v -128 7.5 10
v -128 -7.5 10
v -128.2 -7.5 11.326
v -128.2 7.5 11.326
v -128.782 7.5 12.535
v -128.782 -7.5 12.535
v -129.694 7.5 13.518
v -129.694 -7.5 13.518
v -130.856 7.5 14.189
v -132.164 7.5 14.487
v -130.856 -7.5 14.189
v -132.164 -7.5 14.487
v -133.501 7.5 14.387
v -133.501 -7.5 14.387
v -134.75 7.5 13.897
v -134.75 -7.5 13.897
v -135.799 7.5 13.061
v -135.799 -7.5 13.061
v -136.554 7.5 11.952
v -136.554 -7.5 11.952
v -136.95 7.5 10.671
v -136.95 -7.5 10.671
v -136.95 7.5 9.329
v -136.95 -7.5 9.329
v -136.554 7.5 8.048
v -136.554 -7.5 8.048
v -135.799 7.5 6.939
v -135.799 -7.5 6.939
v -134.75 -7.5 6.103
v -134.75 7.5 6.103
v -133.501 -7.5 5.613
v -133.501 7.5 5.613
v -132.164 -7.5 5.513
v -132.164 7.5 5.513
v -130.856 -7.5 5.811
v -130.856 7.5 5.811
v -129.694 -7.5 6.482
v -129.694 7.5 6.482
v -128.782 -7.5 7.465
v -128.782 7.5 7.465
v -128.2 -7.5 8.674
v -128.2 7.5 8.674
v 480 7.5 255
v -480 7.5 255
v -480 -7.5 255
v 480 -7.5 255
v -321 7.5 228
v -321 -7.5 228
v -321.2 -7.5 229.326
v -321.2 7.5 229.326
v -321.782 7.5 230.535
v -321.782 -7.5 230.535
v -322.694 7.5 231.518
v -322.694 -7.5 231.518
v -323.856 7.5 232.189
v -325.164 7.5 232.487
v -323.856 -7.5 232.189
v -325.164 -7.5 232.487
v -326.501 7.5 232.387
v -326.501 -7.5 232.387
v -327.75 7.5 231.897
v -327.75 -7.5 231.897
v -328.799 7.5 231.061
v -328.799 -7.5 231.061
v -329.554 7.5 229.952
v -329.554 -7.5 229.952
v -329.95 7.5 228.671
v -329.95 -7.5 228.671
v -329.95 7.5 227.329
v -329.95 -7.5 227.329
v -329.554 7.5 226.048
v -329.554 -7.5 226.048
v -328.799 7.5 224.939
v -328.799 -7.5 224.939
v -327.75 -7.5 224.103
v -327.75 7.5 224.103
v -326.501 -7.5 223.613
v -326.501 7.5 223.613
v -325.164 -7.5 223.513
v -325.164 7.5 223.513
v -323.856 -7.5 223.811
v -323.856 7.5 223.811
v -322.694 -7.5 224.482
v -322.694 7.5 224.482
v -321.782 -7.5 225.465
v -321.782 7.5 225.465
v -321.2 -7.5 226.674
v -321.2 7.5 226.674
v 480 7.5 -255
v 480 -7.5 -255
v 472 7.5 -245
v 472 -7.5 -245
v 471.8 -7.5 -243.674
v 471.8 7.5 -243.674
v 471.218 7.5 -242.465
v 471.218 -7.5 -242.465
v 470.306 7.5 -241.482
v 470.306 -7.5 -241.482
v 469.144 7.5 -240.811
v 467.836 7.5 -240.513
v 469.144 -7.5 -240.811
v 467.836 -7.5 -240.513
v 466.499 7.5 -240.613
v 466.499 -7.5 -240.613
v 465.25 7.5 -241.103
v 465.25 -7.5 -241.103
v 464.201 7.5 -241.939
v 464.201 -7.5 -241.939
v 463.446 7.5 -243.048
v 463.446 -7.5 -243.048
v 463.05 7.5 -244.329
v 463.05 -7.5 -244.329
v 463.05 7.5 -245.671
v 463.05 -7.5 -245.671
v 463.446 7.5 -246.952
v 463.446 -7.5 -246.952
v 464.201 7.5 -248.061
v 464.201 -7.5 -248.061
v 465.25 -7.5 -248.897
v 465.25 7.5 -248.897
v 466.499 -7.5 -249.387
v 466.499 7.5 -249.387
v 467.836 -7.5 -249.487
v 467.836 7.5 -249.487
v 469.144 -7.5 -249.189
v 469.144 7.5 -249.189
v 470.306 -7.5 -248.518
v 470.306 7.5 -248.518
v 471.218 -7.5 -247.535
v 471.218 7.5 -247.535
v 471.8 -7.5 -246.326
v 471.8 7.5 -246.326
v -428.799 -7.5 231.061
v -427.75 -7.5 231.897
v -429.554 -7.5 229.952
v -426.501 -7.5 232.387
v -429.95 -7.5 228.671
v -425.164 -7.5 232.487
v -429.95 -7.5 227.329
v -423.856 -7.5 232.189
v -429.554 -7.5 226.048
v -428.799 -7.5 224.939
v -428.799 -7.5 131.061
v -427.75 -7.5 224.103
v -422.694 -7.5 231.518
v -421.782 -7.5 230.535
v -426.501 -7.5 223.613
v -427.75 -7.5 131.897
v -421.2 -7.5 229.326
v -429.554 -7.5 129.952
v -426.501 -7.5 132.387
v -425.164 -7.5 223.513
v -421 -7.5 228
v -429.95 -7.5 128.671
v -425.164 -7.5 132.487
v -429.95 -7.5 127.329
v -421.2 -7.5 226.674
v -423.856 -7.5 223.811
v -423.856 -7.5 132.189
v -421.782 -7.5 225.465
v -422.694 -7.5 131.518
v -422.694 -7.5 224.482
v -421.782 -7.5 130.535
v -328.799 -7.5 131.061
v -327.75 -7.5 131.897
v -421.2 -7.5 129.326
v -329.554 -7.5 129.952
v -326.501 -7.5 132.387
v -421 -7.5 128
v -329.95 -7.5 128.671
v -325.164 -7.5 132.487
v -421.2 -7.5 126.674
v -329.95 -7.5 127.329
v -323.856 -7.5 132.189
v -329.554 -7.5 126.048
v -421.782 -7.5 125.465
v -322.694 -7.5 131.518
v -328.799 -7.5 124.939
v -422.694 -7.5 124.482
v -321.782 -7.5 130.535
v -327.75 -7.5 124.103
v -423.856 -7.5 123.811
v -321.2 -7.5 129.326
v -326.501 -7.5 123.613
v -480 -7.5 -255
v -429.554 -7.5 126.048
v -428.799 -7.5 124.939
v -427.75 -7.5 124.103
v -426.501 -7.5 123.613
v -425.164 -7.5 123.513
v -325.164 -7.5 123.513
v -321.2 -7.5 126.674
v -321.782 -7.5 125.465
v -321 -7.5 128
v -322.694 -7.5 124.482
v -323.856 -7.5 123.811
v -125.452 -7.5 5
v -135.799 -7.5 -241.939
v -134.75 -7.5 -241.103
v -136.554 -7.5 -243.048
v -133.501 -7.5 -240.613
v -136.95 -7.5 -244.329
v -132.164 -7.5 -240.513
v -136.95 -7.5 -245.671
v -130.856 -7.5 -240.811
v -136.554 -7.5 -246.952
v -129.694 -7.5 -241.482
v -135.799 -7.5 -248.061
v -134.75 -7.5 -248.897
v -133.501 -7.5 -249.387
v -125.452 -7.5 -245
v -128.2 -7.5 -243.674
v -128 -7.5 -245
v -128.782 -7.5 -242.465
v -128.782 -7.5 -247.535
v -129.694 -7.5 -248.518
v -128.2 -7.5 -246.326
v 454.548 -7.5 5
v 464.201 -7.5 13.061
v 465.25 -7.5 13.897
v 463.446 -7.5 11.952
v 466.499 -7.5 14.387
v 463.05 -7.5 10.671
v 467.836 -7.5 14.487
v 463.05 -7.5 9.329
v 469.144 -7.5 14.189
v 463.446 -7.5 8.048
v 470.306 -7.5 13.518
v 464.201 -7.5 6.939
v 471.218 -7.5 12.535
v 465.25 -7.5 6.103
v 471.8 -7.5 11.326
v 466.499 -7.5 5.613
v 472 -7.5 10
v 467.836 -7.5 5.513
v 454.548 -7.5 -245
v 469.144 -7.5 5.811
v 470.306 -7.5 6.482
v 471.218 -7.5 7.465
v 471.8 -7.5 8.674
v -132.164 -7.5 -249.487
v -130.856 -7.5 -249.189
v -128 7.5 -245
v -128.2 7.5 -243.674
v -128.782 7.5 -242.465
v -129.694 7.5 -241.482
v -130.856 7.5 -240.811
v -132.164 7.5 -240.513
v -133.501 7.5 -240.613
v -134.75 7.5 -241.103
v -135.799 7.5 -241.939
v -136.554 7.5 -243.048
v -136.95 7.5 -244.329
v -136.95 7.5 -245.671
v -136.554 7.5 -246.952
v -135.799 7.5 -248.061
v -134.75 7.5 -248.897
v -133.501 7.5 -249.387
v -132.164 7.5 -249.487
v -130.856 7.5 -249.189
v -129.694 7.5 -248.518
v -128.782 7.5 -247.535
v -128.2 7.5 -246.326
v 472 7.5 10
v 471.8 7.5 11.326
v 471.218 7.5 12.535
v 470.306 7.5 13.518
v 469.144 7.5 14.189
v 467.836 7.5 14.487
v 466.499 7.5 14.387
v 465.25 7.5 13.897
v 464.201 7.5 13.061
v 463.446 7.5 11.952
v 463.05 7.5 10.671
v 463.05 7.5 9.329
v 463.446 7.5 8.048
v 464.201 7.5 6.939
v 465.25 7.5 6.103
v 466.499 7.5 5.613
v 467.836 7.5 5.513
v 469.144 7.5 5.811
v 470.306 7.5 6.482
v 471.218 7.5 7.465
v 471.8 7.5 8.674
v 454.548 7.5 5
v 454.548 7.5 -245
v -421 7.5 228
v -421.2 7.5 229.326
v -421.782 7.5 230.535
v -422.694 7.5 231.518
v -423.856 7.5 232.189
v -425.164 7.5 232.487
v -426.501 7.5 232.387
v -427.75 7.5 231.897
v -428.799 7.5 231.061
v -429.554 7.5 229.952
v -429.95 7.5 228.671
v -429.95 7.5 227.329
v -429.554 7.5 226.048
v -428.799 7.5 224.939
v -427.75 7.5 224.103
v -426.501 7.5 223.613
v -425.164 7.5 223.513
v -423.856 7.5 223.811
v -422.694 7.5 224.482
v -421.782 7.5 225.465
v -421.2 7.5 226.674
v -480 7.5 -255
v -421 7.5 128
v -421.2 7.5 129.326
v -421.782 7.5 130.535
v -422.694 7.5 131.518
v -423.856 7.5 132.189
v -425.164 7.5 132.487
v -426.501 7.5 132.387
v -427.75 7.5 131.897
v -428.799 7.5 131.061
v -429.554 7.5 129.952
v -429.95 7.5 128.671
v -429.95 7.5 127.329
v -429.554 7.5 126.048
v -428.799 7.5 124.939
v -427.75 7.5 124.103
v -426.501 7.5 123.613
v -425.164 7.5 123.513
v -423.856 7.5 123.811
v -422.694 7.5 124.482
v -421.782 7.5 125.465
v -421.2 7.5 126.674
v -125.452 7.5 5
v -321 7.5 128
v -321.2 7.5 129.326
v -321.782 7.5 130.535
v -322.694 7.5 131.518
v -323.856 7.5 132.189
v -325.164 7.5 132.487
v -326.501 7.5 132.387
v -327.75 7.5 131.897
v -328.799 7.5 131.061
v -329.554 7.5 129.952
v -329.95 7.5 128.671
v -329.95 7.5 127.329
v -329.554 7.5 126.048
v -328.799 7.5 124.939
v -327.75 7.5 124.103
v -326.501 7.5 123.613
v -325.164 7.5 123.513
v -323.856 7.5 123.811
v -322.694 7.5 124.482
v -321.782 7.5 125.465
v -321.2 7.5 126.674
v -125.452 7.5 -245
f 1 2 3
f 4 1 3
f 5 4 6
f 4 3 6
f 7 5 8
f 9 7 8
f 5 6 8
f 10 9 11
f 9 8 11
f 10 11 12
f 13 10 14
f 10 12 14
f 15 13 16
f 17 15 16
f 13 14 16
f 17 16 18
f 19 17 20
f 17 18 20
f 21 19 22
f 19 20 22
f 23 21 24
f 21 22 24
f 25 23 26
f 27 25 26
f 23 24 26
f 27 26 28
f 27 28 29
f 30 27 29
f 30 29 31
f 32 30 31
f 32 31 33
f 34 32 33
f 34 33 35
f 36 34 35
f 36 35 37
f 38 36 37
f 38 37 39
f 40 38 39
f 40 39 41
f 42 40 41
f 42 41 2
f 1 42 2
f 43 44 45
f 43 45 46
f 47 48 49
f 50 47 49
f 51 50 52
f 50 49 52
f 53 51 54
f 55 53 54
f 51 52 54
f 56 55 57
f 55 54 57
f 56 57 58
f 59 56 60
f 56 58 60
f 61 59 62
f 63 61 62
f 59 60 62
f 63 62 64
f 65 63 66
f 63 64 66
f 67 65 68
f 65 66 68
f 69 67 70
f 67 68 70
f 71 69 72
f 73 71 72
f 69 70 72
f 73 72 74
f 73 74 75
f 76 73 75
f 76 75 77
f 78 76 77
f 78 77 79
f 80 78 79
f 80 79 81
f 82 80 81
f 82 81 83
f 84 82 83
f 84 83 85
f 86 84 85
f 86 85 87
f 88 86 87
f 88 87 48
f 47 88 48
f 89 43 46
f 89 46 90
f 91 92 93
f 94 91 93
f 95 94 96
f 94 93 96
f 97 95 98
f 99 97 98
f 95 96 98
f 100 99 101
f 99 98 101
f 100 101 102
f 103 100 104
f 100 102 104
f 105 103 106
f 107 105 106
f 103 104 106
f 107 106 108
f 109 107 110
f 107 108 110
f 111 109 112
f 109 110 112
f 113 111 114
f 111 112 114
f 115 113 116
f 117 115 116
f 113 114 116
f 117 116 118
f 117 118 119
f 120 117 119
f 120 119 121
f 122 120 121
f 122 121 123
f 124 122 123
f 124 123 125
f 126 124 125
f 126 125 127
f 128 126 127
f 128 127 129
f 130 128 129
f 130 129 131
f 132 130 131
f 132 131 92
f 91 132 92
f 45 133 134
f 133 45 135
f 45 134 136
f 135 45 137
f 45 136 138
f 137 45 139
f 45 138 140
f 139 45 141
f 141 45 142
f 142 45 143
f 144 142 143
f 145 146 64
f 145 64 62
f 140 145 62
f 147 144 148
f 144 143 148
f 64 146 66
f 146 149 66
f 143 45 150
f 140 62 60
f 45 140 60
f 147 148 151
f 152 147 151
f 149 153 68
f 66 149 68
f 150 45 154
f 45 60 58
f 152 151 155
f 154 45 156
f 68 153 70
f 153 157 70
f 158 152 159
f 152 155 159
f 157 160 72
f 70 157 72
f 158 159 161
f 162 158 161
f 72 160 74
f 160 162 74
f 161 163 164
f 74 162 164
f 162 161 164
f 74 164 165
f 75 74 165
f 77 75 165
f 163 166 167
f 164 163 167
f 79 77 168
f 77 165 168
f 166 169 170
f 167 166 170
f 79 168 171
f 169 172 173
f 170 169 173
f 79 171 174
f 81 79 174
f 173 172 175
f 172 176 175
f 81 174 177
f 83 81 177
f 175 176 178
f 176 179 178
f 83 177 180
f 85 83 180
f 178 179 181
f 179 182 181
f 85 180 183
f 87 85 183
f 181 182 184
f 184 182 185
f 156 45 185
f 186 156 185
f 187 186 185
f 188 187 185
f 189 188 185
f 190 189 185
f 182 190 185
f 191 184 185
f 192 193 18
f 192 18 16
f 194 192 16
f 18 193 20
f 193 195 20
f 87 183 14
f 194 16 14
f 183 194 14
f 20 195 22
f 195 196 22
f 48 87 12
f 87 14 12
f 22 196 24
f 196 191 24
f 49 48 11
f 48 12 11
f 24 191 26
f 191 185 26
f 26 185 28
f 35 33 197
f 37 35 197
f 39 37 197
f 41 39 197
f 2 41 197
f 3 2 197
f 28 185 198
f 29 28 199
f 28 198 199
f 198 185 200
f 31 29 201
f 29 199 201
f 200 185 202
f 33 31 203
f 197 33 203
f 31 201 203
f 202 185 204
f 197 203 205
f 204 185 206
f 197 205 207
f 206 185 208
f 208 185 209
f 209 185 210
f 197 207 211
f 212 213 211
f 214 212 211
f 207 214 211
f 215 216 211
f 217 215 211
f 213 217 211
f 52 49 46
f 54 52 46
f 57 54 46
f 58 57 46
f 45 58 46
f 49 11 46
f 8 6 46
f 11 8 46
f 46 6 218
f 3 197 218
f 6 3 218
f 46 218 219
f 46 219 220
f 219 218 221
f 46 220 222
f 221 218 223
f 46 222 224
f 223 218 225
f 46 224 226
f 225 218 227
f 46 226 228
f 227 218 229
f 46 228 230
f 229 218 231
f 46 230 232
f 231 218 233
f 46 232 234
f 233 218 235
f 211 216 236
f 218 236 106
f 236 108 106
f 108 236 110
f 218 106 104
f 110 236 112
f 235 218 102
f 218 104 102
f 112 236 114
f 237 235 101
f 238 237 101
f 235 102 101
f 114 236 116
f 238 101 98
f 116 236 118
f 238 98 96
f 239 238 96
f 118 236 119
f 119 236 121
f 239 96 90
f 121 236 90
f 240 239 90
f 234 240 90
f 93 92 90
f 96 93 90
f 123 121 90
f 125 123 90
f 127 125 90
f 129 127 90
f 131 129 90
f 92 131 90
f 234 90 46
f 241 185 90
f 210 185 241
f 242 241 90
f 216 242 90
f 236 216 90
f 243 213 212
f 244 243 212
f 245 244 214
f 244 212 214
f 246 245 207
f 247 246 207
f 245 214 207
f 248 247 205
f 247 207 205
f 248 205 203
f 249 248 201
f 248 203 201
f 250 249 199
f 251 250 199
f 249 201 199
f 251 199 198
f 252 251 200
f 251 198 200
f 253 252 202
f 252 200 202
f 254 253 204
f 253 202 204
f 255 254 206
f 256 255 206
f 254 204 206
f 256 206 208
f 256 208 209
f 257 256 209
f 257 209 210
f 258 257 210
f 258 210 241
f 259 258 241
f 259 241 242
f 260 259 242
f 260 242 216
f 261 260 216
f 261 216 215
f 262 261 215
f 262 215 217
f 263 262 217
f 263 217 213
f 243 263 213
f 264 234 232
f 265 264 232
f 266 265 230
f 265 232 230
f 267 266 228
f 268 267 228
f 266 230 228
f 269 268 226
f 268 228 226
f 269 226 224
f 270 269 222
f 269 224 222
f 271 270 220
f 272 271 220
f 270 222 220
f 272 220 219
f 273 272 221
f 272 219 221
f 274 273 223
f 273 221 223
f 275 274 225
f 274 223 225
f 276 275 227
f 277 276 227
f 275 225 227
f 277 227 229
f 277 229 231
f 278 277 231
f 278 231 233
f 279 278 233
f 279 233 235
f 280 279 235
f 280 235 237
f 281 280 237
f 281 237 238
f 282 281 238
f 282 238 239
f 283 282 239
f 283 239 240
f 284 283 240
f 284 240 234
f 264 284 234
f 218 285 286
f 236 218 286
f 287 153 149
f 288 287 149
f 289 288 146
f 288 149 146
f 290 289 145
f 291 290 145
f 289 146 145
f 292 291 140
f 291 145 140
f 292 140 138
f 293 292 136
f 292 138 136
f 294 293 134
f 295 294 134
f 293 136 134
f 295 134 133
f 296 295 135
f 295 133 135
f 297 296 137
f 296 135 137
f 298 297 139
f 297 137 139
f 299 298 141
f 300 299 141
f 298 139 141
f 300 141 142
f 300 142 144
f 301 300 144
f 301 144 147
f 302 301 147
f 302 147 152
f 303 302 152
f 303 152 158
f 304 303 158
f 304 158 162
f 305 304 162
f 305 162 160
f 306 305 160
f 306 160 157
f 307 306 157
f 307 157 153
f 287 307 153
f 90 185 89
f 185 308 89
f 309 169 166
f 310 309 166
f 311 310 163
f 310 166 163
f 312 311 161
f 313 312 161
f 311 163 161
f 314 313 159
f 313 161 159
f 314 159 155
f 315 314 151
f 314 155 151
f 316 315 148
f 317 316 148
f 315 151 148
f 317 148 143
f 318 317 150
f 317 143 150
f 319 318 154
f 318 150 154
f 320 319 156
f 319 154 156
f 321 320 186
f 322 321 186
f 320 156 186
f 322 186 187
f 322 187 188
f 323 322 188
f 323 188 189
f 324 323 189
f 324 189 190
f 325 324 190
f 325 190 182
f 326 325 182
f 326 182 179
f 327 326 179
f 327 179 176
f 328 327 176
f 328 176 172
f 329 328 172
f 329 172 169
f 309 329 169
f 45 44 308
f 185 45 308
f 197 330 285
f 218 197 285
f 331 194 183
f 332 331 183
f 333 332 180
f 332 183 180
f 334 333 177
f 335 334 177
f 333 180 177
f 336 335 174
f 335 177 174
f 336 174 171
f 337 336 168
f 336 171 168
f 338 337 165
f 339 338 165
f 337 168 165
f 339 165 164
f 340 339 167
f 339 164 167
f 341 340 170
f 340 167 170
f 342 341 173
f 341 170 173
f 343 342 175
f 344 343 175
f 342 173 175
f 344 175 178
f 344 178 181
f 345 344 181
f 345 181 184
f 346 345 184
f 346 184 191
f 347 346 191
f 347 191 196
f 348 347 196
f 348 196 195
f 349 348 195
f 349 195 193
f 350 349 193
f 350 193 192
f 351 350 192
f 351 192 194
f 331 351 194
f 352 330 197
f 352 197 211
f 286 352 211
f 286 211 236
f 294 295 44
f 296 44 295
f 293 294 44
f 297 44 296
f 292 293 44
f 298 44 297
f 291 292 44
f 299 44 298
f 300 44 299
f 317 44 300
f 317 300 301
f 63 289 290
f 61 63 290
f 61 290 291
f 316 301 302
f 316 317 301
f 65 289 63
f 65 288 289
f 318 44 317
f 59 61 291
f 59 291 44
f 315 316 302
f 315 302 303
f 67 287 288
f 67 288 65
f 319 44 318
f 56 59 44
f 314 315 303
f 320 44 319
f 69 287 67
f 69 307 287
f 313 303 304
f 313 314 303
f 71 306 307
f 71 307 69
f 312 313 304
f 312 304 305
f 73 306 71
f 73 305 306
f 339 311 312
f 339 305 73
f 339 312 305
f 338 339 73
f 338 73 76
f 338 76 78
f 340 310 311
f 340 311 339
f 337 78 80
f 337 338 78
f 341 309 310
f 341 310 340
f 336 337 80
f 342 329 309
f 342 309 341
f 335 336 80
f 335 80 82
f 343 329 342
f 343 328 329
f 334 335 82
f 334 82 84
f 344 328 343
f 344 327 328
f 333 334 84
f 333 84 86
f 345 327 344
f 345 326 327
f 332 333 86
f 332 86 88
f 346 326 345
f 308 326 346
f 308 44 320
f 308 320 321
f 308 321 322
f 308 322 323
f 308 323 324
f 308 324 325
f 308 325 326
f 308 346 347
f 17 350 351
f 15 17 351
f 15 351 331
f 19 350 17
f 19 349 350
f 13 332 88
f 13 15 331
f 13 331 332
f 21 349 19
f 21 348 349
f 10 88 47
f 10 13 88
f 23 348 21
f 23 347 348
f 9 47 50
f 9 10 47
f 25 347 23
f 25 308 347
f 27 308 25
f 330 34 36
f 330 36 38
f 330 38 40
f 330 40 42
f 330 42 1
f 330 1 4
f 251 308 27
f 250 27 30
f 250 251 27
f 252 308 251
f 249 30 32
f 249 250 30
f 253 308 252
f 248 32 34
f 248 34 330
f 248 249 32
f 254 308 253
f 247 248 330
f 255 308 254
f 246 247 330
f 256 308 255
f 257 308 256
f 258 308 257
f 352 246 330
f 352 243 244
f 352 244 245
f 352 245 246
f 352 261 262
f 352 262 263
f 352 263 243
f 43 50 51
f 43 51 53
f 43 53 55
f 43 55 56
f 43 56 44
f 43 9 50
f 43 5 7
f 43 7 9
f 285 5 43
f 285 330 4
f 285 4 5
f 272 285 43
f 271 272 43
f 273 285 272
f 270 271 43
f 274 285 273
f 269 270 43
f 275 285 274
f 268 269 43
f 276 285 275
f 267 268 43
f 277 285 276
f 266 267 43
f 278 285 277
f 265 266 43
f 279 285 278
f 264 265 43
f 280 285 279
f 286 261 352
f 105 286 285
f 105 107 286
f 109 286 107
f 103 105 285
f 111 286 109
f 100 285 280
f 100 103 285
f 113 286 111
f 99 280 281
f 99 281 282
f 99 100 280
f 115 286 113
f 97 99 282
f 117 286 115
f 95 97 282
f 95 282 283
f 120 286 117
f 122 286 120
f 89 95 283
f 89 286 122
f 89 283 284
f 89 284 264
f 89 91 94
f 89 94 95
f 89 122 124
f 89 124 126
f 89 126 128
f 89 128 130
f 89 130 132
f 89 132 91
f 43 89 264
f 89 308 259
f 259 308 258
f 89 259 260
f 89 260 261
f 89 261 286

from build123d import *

# Parameters (mm, degrees)
SKETCH1_W               = 960
SKETCH1_H               = 510
BOSS_EXTRUDE1_DEPTH     = 7.5
SKETCH3_W               = 580
SKETCH3_H               = 250
CUT_EXTRUDE1_DEPTH      = 16
ESQUISSE3_R             = 4.5
ENL_V_MAT_EXTRU_2_DEPTH = 16


with BuildPart() as part:
    # Sketch1 → Boss-Extrude1 (new body, symmetric)
    with BuildSketch(Plane(origin=(0, 0, 0), x_dir=(1, 0, 0), z_dir=(0, 1, 0))):
        Rectangle(SKETCH1_W, SKETCH1_H)
    extrude(amount=BOSS_EXTRUDE1_DEPTH, both=True)

    # Sketch3 → Cut-Extrude1 (cut, through all)
    with BuildSketch(Plane(origin=(0, 7.5, 0), x_dir=(1, 0, 0), z_dir=(0, 1, 0))):
        with Locations((164.54751, 120)):
            Rectangle(SKETCH3_W, SKETCH3_H)
    extrude(amount=-CUT_EXTRUDE1_DEPTH, mode=Mode.SUBTRACT)

    # Esquisse3 → Enlèv. mat.-Extru.2 (cut, through all)
    with BuildSketch(Plane.XZ.offset(7.5)):
        with Locations((-425.5, 228)):
            Circle(ESQUISSE3_R)
        with Locations((-425.5, 128)):
            Circle(ESQUISSE3_R)
        with Locations((-325.5, 128)):
            Circle(ESQUISSE3_R)
        with Locations((-325.5, 228)):
            Circle(ESQUISSE3_R)
        with Locations((-132.5, 10)):
            Circle(ESQUISSE3_R)
        with Locations((-132.5, -245)):
            Circle(ESQUISSE3_R)
        with Locations((467.5, -245)):
            Circle(ESQUISSE3_R)
        with Locations((467.5, 10)):
            Circle(ESQUISSE3_R)
    extrude(amount=-ENL_V_MAT_EXTRU_2_DEPTH, mode=Mode.SUBTRACT)


solid = part.part
